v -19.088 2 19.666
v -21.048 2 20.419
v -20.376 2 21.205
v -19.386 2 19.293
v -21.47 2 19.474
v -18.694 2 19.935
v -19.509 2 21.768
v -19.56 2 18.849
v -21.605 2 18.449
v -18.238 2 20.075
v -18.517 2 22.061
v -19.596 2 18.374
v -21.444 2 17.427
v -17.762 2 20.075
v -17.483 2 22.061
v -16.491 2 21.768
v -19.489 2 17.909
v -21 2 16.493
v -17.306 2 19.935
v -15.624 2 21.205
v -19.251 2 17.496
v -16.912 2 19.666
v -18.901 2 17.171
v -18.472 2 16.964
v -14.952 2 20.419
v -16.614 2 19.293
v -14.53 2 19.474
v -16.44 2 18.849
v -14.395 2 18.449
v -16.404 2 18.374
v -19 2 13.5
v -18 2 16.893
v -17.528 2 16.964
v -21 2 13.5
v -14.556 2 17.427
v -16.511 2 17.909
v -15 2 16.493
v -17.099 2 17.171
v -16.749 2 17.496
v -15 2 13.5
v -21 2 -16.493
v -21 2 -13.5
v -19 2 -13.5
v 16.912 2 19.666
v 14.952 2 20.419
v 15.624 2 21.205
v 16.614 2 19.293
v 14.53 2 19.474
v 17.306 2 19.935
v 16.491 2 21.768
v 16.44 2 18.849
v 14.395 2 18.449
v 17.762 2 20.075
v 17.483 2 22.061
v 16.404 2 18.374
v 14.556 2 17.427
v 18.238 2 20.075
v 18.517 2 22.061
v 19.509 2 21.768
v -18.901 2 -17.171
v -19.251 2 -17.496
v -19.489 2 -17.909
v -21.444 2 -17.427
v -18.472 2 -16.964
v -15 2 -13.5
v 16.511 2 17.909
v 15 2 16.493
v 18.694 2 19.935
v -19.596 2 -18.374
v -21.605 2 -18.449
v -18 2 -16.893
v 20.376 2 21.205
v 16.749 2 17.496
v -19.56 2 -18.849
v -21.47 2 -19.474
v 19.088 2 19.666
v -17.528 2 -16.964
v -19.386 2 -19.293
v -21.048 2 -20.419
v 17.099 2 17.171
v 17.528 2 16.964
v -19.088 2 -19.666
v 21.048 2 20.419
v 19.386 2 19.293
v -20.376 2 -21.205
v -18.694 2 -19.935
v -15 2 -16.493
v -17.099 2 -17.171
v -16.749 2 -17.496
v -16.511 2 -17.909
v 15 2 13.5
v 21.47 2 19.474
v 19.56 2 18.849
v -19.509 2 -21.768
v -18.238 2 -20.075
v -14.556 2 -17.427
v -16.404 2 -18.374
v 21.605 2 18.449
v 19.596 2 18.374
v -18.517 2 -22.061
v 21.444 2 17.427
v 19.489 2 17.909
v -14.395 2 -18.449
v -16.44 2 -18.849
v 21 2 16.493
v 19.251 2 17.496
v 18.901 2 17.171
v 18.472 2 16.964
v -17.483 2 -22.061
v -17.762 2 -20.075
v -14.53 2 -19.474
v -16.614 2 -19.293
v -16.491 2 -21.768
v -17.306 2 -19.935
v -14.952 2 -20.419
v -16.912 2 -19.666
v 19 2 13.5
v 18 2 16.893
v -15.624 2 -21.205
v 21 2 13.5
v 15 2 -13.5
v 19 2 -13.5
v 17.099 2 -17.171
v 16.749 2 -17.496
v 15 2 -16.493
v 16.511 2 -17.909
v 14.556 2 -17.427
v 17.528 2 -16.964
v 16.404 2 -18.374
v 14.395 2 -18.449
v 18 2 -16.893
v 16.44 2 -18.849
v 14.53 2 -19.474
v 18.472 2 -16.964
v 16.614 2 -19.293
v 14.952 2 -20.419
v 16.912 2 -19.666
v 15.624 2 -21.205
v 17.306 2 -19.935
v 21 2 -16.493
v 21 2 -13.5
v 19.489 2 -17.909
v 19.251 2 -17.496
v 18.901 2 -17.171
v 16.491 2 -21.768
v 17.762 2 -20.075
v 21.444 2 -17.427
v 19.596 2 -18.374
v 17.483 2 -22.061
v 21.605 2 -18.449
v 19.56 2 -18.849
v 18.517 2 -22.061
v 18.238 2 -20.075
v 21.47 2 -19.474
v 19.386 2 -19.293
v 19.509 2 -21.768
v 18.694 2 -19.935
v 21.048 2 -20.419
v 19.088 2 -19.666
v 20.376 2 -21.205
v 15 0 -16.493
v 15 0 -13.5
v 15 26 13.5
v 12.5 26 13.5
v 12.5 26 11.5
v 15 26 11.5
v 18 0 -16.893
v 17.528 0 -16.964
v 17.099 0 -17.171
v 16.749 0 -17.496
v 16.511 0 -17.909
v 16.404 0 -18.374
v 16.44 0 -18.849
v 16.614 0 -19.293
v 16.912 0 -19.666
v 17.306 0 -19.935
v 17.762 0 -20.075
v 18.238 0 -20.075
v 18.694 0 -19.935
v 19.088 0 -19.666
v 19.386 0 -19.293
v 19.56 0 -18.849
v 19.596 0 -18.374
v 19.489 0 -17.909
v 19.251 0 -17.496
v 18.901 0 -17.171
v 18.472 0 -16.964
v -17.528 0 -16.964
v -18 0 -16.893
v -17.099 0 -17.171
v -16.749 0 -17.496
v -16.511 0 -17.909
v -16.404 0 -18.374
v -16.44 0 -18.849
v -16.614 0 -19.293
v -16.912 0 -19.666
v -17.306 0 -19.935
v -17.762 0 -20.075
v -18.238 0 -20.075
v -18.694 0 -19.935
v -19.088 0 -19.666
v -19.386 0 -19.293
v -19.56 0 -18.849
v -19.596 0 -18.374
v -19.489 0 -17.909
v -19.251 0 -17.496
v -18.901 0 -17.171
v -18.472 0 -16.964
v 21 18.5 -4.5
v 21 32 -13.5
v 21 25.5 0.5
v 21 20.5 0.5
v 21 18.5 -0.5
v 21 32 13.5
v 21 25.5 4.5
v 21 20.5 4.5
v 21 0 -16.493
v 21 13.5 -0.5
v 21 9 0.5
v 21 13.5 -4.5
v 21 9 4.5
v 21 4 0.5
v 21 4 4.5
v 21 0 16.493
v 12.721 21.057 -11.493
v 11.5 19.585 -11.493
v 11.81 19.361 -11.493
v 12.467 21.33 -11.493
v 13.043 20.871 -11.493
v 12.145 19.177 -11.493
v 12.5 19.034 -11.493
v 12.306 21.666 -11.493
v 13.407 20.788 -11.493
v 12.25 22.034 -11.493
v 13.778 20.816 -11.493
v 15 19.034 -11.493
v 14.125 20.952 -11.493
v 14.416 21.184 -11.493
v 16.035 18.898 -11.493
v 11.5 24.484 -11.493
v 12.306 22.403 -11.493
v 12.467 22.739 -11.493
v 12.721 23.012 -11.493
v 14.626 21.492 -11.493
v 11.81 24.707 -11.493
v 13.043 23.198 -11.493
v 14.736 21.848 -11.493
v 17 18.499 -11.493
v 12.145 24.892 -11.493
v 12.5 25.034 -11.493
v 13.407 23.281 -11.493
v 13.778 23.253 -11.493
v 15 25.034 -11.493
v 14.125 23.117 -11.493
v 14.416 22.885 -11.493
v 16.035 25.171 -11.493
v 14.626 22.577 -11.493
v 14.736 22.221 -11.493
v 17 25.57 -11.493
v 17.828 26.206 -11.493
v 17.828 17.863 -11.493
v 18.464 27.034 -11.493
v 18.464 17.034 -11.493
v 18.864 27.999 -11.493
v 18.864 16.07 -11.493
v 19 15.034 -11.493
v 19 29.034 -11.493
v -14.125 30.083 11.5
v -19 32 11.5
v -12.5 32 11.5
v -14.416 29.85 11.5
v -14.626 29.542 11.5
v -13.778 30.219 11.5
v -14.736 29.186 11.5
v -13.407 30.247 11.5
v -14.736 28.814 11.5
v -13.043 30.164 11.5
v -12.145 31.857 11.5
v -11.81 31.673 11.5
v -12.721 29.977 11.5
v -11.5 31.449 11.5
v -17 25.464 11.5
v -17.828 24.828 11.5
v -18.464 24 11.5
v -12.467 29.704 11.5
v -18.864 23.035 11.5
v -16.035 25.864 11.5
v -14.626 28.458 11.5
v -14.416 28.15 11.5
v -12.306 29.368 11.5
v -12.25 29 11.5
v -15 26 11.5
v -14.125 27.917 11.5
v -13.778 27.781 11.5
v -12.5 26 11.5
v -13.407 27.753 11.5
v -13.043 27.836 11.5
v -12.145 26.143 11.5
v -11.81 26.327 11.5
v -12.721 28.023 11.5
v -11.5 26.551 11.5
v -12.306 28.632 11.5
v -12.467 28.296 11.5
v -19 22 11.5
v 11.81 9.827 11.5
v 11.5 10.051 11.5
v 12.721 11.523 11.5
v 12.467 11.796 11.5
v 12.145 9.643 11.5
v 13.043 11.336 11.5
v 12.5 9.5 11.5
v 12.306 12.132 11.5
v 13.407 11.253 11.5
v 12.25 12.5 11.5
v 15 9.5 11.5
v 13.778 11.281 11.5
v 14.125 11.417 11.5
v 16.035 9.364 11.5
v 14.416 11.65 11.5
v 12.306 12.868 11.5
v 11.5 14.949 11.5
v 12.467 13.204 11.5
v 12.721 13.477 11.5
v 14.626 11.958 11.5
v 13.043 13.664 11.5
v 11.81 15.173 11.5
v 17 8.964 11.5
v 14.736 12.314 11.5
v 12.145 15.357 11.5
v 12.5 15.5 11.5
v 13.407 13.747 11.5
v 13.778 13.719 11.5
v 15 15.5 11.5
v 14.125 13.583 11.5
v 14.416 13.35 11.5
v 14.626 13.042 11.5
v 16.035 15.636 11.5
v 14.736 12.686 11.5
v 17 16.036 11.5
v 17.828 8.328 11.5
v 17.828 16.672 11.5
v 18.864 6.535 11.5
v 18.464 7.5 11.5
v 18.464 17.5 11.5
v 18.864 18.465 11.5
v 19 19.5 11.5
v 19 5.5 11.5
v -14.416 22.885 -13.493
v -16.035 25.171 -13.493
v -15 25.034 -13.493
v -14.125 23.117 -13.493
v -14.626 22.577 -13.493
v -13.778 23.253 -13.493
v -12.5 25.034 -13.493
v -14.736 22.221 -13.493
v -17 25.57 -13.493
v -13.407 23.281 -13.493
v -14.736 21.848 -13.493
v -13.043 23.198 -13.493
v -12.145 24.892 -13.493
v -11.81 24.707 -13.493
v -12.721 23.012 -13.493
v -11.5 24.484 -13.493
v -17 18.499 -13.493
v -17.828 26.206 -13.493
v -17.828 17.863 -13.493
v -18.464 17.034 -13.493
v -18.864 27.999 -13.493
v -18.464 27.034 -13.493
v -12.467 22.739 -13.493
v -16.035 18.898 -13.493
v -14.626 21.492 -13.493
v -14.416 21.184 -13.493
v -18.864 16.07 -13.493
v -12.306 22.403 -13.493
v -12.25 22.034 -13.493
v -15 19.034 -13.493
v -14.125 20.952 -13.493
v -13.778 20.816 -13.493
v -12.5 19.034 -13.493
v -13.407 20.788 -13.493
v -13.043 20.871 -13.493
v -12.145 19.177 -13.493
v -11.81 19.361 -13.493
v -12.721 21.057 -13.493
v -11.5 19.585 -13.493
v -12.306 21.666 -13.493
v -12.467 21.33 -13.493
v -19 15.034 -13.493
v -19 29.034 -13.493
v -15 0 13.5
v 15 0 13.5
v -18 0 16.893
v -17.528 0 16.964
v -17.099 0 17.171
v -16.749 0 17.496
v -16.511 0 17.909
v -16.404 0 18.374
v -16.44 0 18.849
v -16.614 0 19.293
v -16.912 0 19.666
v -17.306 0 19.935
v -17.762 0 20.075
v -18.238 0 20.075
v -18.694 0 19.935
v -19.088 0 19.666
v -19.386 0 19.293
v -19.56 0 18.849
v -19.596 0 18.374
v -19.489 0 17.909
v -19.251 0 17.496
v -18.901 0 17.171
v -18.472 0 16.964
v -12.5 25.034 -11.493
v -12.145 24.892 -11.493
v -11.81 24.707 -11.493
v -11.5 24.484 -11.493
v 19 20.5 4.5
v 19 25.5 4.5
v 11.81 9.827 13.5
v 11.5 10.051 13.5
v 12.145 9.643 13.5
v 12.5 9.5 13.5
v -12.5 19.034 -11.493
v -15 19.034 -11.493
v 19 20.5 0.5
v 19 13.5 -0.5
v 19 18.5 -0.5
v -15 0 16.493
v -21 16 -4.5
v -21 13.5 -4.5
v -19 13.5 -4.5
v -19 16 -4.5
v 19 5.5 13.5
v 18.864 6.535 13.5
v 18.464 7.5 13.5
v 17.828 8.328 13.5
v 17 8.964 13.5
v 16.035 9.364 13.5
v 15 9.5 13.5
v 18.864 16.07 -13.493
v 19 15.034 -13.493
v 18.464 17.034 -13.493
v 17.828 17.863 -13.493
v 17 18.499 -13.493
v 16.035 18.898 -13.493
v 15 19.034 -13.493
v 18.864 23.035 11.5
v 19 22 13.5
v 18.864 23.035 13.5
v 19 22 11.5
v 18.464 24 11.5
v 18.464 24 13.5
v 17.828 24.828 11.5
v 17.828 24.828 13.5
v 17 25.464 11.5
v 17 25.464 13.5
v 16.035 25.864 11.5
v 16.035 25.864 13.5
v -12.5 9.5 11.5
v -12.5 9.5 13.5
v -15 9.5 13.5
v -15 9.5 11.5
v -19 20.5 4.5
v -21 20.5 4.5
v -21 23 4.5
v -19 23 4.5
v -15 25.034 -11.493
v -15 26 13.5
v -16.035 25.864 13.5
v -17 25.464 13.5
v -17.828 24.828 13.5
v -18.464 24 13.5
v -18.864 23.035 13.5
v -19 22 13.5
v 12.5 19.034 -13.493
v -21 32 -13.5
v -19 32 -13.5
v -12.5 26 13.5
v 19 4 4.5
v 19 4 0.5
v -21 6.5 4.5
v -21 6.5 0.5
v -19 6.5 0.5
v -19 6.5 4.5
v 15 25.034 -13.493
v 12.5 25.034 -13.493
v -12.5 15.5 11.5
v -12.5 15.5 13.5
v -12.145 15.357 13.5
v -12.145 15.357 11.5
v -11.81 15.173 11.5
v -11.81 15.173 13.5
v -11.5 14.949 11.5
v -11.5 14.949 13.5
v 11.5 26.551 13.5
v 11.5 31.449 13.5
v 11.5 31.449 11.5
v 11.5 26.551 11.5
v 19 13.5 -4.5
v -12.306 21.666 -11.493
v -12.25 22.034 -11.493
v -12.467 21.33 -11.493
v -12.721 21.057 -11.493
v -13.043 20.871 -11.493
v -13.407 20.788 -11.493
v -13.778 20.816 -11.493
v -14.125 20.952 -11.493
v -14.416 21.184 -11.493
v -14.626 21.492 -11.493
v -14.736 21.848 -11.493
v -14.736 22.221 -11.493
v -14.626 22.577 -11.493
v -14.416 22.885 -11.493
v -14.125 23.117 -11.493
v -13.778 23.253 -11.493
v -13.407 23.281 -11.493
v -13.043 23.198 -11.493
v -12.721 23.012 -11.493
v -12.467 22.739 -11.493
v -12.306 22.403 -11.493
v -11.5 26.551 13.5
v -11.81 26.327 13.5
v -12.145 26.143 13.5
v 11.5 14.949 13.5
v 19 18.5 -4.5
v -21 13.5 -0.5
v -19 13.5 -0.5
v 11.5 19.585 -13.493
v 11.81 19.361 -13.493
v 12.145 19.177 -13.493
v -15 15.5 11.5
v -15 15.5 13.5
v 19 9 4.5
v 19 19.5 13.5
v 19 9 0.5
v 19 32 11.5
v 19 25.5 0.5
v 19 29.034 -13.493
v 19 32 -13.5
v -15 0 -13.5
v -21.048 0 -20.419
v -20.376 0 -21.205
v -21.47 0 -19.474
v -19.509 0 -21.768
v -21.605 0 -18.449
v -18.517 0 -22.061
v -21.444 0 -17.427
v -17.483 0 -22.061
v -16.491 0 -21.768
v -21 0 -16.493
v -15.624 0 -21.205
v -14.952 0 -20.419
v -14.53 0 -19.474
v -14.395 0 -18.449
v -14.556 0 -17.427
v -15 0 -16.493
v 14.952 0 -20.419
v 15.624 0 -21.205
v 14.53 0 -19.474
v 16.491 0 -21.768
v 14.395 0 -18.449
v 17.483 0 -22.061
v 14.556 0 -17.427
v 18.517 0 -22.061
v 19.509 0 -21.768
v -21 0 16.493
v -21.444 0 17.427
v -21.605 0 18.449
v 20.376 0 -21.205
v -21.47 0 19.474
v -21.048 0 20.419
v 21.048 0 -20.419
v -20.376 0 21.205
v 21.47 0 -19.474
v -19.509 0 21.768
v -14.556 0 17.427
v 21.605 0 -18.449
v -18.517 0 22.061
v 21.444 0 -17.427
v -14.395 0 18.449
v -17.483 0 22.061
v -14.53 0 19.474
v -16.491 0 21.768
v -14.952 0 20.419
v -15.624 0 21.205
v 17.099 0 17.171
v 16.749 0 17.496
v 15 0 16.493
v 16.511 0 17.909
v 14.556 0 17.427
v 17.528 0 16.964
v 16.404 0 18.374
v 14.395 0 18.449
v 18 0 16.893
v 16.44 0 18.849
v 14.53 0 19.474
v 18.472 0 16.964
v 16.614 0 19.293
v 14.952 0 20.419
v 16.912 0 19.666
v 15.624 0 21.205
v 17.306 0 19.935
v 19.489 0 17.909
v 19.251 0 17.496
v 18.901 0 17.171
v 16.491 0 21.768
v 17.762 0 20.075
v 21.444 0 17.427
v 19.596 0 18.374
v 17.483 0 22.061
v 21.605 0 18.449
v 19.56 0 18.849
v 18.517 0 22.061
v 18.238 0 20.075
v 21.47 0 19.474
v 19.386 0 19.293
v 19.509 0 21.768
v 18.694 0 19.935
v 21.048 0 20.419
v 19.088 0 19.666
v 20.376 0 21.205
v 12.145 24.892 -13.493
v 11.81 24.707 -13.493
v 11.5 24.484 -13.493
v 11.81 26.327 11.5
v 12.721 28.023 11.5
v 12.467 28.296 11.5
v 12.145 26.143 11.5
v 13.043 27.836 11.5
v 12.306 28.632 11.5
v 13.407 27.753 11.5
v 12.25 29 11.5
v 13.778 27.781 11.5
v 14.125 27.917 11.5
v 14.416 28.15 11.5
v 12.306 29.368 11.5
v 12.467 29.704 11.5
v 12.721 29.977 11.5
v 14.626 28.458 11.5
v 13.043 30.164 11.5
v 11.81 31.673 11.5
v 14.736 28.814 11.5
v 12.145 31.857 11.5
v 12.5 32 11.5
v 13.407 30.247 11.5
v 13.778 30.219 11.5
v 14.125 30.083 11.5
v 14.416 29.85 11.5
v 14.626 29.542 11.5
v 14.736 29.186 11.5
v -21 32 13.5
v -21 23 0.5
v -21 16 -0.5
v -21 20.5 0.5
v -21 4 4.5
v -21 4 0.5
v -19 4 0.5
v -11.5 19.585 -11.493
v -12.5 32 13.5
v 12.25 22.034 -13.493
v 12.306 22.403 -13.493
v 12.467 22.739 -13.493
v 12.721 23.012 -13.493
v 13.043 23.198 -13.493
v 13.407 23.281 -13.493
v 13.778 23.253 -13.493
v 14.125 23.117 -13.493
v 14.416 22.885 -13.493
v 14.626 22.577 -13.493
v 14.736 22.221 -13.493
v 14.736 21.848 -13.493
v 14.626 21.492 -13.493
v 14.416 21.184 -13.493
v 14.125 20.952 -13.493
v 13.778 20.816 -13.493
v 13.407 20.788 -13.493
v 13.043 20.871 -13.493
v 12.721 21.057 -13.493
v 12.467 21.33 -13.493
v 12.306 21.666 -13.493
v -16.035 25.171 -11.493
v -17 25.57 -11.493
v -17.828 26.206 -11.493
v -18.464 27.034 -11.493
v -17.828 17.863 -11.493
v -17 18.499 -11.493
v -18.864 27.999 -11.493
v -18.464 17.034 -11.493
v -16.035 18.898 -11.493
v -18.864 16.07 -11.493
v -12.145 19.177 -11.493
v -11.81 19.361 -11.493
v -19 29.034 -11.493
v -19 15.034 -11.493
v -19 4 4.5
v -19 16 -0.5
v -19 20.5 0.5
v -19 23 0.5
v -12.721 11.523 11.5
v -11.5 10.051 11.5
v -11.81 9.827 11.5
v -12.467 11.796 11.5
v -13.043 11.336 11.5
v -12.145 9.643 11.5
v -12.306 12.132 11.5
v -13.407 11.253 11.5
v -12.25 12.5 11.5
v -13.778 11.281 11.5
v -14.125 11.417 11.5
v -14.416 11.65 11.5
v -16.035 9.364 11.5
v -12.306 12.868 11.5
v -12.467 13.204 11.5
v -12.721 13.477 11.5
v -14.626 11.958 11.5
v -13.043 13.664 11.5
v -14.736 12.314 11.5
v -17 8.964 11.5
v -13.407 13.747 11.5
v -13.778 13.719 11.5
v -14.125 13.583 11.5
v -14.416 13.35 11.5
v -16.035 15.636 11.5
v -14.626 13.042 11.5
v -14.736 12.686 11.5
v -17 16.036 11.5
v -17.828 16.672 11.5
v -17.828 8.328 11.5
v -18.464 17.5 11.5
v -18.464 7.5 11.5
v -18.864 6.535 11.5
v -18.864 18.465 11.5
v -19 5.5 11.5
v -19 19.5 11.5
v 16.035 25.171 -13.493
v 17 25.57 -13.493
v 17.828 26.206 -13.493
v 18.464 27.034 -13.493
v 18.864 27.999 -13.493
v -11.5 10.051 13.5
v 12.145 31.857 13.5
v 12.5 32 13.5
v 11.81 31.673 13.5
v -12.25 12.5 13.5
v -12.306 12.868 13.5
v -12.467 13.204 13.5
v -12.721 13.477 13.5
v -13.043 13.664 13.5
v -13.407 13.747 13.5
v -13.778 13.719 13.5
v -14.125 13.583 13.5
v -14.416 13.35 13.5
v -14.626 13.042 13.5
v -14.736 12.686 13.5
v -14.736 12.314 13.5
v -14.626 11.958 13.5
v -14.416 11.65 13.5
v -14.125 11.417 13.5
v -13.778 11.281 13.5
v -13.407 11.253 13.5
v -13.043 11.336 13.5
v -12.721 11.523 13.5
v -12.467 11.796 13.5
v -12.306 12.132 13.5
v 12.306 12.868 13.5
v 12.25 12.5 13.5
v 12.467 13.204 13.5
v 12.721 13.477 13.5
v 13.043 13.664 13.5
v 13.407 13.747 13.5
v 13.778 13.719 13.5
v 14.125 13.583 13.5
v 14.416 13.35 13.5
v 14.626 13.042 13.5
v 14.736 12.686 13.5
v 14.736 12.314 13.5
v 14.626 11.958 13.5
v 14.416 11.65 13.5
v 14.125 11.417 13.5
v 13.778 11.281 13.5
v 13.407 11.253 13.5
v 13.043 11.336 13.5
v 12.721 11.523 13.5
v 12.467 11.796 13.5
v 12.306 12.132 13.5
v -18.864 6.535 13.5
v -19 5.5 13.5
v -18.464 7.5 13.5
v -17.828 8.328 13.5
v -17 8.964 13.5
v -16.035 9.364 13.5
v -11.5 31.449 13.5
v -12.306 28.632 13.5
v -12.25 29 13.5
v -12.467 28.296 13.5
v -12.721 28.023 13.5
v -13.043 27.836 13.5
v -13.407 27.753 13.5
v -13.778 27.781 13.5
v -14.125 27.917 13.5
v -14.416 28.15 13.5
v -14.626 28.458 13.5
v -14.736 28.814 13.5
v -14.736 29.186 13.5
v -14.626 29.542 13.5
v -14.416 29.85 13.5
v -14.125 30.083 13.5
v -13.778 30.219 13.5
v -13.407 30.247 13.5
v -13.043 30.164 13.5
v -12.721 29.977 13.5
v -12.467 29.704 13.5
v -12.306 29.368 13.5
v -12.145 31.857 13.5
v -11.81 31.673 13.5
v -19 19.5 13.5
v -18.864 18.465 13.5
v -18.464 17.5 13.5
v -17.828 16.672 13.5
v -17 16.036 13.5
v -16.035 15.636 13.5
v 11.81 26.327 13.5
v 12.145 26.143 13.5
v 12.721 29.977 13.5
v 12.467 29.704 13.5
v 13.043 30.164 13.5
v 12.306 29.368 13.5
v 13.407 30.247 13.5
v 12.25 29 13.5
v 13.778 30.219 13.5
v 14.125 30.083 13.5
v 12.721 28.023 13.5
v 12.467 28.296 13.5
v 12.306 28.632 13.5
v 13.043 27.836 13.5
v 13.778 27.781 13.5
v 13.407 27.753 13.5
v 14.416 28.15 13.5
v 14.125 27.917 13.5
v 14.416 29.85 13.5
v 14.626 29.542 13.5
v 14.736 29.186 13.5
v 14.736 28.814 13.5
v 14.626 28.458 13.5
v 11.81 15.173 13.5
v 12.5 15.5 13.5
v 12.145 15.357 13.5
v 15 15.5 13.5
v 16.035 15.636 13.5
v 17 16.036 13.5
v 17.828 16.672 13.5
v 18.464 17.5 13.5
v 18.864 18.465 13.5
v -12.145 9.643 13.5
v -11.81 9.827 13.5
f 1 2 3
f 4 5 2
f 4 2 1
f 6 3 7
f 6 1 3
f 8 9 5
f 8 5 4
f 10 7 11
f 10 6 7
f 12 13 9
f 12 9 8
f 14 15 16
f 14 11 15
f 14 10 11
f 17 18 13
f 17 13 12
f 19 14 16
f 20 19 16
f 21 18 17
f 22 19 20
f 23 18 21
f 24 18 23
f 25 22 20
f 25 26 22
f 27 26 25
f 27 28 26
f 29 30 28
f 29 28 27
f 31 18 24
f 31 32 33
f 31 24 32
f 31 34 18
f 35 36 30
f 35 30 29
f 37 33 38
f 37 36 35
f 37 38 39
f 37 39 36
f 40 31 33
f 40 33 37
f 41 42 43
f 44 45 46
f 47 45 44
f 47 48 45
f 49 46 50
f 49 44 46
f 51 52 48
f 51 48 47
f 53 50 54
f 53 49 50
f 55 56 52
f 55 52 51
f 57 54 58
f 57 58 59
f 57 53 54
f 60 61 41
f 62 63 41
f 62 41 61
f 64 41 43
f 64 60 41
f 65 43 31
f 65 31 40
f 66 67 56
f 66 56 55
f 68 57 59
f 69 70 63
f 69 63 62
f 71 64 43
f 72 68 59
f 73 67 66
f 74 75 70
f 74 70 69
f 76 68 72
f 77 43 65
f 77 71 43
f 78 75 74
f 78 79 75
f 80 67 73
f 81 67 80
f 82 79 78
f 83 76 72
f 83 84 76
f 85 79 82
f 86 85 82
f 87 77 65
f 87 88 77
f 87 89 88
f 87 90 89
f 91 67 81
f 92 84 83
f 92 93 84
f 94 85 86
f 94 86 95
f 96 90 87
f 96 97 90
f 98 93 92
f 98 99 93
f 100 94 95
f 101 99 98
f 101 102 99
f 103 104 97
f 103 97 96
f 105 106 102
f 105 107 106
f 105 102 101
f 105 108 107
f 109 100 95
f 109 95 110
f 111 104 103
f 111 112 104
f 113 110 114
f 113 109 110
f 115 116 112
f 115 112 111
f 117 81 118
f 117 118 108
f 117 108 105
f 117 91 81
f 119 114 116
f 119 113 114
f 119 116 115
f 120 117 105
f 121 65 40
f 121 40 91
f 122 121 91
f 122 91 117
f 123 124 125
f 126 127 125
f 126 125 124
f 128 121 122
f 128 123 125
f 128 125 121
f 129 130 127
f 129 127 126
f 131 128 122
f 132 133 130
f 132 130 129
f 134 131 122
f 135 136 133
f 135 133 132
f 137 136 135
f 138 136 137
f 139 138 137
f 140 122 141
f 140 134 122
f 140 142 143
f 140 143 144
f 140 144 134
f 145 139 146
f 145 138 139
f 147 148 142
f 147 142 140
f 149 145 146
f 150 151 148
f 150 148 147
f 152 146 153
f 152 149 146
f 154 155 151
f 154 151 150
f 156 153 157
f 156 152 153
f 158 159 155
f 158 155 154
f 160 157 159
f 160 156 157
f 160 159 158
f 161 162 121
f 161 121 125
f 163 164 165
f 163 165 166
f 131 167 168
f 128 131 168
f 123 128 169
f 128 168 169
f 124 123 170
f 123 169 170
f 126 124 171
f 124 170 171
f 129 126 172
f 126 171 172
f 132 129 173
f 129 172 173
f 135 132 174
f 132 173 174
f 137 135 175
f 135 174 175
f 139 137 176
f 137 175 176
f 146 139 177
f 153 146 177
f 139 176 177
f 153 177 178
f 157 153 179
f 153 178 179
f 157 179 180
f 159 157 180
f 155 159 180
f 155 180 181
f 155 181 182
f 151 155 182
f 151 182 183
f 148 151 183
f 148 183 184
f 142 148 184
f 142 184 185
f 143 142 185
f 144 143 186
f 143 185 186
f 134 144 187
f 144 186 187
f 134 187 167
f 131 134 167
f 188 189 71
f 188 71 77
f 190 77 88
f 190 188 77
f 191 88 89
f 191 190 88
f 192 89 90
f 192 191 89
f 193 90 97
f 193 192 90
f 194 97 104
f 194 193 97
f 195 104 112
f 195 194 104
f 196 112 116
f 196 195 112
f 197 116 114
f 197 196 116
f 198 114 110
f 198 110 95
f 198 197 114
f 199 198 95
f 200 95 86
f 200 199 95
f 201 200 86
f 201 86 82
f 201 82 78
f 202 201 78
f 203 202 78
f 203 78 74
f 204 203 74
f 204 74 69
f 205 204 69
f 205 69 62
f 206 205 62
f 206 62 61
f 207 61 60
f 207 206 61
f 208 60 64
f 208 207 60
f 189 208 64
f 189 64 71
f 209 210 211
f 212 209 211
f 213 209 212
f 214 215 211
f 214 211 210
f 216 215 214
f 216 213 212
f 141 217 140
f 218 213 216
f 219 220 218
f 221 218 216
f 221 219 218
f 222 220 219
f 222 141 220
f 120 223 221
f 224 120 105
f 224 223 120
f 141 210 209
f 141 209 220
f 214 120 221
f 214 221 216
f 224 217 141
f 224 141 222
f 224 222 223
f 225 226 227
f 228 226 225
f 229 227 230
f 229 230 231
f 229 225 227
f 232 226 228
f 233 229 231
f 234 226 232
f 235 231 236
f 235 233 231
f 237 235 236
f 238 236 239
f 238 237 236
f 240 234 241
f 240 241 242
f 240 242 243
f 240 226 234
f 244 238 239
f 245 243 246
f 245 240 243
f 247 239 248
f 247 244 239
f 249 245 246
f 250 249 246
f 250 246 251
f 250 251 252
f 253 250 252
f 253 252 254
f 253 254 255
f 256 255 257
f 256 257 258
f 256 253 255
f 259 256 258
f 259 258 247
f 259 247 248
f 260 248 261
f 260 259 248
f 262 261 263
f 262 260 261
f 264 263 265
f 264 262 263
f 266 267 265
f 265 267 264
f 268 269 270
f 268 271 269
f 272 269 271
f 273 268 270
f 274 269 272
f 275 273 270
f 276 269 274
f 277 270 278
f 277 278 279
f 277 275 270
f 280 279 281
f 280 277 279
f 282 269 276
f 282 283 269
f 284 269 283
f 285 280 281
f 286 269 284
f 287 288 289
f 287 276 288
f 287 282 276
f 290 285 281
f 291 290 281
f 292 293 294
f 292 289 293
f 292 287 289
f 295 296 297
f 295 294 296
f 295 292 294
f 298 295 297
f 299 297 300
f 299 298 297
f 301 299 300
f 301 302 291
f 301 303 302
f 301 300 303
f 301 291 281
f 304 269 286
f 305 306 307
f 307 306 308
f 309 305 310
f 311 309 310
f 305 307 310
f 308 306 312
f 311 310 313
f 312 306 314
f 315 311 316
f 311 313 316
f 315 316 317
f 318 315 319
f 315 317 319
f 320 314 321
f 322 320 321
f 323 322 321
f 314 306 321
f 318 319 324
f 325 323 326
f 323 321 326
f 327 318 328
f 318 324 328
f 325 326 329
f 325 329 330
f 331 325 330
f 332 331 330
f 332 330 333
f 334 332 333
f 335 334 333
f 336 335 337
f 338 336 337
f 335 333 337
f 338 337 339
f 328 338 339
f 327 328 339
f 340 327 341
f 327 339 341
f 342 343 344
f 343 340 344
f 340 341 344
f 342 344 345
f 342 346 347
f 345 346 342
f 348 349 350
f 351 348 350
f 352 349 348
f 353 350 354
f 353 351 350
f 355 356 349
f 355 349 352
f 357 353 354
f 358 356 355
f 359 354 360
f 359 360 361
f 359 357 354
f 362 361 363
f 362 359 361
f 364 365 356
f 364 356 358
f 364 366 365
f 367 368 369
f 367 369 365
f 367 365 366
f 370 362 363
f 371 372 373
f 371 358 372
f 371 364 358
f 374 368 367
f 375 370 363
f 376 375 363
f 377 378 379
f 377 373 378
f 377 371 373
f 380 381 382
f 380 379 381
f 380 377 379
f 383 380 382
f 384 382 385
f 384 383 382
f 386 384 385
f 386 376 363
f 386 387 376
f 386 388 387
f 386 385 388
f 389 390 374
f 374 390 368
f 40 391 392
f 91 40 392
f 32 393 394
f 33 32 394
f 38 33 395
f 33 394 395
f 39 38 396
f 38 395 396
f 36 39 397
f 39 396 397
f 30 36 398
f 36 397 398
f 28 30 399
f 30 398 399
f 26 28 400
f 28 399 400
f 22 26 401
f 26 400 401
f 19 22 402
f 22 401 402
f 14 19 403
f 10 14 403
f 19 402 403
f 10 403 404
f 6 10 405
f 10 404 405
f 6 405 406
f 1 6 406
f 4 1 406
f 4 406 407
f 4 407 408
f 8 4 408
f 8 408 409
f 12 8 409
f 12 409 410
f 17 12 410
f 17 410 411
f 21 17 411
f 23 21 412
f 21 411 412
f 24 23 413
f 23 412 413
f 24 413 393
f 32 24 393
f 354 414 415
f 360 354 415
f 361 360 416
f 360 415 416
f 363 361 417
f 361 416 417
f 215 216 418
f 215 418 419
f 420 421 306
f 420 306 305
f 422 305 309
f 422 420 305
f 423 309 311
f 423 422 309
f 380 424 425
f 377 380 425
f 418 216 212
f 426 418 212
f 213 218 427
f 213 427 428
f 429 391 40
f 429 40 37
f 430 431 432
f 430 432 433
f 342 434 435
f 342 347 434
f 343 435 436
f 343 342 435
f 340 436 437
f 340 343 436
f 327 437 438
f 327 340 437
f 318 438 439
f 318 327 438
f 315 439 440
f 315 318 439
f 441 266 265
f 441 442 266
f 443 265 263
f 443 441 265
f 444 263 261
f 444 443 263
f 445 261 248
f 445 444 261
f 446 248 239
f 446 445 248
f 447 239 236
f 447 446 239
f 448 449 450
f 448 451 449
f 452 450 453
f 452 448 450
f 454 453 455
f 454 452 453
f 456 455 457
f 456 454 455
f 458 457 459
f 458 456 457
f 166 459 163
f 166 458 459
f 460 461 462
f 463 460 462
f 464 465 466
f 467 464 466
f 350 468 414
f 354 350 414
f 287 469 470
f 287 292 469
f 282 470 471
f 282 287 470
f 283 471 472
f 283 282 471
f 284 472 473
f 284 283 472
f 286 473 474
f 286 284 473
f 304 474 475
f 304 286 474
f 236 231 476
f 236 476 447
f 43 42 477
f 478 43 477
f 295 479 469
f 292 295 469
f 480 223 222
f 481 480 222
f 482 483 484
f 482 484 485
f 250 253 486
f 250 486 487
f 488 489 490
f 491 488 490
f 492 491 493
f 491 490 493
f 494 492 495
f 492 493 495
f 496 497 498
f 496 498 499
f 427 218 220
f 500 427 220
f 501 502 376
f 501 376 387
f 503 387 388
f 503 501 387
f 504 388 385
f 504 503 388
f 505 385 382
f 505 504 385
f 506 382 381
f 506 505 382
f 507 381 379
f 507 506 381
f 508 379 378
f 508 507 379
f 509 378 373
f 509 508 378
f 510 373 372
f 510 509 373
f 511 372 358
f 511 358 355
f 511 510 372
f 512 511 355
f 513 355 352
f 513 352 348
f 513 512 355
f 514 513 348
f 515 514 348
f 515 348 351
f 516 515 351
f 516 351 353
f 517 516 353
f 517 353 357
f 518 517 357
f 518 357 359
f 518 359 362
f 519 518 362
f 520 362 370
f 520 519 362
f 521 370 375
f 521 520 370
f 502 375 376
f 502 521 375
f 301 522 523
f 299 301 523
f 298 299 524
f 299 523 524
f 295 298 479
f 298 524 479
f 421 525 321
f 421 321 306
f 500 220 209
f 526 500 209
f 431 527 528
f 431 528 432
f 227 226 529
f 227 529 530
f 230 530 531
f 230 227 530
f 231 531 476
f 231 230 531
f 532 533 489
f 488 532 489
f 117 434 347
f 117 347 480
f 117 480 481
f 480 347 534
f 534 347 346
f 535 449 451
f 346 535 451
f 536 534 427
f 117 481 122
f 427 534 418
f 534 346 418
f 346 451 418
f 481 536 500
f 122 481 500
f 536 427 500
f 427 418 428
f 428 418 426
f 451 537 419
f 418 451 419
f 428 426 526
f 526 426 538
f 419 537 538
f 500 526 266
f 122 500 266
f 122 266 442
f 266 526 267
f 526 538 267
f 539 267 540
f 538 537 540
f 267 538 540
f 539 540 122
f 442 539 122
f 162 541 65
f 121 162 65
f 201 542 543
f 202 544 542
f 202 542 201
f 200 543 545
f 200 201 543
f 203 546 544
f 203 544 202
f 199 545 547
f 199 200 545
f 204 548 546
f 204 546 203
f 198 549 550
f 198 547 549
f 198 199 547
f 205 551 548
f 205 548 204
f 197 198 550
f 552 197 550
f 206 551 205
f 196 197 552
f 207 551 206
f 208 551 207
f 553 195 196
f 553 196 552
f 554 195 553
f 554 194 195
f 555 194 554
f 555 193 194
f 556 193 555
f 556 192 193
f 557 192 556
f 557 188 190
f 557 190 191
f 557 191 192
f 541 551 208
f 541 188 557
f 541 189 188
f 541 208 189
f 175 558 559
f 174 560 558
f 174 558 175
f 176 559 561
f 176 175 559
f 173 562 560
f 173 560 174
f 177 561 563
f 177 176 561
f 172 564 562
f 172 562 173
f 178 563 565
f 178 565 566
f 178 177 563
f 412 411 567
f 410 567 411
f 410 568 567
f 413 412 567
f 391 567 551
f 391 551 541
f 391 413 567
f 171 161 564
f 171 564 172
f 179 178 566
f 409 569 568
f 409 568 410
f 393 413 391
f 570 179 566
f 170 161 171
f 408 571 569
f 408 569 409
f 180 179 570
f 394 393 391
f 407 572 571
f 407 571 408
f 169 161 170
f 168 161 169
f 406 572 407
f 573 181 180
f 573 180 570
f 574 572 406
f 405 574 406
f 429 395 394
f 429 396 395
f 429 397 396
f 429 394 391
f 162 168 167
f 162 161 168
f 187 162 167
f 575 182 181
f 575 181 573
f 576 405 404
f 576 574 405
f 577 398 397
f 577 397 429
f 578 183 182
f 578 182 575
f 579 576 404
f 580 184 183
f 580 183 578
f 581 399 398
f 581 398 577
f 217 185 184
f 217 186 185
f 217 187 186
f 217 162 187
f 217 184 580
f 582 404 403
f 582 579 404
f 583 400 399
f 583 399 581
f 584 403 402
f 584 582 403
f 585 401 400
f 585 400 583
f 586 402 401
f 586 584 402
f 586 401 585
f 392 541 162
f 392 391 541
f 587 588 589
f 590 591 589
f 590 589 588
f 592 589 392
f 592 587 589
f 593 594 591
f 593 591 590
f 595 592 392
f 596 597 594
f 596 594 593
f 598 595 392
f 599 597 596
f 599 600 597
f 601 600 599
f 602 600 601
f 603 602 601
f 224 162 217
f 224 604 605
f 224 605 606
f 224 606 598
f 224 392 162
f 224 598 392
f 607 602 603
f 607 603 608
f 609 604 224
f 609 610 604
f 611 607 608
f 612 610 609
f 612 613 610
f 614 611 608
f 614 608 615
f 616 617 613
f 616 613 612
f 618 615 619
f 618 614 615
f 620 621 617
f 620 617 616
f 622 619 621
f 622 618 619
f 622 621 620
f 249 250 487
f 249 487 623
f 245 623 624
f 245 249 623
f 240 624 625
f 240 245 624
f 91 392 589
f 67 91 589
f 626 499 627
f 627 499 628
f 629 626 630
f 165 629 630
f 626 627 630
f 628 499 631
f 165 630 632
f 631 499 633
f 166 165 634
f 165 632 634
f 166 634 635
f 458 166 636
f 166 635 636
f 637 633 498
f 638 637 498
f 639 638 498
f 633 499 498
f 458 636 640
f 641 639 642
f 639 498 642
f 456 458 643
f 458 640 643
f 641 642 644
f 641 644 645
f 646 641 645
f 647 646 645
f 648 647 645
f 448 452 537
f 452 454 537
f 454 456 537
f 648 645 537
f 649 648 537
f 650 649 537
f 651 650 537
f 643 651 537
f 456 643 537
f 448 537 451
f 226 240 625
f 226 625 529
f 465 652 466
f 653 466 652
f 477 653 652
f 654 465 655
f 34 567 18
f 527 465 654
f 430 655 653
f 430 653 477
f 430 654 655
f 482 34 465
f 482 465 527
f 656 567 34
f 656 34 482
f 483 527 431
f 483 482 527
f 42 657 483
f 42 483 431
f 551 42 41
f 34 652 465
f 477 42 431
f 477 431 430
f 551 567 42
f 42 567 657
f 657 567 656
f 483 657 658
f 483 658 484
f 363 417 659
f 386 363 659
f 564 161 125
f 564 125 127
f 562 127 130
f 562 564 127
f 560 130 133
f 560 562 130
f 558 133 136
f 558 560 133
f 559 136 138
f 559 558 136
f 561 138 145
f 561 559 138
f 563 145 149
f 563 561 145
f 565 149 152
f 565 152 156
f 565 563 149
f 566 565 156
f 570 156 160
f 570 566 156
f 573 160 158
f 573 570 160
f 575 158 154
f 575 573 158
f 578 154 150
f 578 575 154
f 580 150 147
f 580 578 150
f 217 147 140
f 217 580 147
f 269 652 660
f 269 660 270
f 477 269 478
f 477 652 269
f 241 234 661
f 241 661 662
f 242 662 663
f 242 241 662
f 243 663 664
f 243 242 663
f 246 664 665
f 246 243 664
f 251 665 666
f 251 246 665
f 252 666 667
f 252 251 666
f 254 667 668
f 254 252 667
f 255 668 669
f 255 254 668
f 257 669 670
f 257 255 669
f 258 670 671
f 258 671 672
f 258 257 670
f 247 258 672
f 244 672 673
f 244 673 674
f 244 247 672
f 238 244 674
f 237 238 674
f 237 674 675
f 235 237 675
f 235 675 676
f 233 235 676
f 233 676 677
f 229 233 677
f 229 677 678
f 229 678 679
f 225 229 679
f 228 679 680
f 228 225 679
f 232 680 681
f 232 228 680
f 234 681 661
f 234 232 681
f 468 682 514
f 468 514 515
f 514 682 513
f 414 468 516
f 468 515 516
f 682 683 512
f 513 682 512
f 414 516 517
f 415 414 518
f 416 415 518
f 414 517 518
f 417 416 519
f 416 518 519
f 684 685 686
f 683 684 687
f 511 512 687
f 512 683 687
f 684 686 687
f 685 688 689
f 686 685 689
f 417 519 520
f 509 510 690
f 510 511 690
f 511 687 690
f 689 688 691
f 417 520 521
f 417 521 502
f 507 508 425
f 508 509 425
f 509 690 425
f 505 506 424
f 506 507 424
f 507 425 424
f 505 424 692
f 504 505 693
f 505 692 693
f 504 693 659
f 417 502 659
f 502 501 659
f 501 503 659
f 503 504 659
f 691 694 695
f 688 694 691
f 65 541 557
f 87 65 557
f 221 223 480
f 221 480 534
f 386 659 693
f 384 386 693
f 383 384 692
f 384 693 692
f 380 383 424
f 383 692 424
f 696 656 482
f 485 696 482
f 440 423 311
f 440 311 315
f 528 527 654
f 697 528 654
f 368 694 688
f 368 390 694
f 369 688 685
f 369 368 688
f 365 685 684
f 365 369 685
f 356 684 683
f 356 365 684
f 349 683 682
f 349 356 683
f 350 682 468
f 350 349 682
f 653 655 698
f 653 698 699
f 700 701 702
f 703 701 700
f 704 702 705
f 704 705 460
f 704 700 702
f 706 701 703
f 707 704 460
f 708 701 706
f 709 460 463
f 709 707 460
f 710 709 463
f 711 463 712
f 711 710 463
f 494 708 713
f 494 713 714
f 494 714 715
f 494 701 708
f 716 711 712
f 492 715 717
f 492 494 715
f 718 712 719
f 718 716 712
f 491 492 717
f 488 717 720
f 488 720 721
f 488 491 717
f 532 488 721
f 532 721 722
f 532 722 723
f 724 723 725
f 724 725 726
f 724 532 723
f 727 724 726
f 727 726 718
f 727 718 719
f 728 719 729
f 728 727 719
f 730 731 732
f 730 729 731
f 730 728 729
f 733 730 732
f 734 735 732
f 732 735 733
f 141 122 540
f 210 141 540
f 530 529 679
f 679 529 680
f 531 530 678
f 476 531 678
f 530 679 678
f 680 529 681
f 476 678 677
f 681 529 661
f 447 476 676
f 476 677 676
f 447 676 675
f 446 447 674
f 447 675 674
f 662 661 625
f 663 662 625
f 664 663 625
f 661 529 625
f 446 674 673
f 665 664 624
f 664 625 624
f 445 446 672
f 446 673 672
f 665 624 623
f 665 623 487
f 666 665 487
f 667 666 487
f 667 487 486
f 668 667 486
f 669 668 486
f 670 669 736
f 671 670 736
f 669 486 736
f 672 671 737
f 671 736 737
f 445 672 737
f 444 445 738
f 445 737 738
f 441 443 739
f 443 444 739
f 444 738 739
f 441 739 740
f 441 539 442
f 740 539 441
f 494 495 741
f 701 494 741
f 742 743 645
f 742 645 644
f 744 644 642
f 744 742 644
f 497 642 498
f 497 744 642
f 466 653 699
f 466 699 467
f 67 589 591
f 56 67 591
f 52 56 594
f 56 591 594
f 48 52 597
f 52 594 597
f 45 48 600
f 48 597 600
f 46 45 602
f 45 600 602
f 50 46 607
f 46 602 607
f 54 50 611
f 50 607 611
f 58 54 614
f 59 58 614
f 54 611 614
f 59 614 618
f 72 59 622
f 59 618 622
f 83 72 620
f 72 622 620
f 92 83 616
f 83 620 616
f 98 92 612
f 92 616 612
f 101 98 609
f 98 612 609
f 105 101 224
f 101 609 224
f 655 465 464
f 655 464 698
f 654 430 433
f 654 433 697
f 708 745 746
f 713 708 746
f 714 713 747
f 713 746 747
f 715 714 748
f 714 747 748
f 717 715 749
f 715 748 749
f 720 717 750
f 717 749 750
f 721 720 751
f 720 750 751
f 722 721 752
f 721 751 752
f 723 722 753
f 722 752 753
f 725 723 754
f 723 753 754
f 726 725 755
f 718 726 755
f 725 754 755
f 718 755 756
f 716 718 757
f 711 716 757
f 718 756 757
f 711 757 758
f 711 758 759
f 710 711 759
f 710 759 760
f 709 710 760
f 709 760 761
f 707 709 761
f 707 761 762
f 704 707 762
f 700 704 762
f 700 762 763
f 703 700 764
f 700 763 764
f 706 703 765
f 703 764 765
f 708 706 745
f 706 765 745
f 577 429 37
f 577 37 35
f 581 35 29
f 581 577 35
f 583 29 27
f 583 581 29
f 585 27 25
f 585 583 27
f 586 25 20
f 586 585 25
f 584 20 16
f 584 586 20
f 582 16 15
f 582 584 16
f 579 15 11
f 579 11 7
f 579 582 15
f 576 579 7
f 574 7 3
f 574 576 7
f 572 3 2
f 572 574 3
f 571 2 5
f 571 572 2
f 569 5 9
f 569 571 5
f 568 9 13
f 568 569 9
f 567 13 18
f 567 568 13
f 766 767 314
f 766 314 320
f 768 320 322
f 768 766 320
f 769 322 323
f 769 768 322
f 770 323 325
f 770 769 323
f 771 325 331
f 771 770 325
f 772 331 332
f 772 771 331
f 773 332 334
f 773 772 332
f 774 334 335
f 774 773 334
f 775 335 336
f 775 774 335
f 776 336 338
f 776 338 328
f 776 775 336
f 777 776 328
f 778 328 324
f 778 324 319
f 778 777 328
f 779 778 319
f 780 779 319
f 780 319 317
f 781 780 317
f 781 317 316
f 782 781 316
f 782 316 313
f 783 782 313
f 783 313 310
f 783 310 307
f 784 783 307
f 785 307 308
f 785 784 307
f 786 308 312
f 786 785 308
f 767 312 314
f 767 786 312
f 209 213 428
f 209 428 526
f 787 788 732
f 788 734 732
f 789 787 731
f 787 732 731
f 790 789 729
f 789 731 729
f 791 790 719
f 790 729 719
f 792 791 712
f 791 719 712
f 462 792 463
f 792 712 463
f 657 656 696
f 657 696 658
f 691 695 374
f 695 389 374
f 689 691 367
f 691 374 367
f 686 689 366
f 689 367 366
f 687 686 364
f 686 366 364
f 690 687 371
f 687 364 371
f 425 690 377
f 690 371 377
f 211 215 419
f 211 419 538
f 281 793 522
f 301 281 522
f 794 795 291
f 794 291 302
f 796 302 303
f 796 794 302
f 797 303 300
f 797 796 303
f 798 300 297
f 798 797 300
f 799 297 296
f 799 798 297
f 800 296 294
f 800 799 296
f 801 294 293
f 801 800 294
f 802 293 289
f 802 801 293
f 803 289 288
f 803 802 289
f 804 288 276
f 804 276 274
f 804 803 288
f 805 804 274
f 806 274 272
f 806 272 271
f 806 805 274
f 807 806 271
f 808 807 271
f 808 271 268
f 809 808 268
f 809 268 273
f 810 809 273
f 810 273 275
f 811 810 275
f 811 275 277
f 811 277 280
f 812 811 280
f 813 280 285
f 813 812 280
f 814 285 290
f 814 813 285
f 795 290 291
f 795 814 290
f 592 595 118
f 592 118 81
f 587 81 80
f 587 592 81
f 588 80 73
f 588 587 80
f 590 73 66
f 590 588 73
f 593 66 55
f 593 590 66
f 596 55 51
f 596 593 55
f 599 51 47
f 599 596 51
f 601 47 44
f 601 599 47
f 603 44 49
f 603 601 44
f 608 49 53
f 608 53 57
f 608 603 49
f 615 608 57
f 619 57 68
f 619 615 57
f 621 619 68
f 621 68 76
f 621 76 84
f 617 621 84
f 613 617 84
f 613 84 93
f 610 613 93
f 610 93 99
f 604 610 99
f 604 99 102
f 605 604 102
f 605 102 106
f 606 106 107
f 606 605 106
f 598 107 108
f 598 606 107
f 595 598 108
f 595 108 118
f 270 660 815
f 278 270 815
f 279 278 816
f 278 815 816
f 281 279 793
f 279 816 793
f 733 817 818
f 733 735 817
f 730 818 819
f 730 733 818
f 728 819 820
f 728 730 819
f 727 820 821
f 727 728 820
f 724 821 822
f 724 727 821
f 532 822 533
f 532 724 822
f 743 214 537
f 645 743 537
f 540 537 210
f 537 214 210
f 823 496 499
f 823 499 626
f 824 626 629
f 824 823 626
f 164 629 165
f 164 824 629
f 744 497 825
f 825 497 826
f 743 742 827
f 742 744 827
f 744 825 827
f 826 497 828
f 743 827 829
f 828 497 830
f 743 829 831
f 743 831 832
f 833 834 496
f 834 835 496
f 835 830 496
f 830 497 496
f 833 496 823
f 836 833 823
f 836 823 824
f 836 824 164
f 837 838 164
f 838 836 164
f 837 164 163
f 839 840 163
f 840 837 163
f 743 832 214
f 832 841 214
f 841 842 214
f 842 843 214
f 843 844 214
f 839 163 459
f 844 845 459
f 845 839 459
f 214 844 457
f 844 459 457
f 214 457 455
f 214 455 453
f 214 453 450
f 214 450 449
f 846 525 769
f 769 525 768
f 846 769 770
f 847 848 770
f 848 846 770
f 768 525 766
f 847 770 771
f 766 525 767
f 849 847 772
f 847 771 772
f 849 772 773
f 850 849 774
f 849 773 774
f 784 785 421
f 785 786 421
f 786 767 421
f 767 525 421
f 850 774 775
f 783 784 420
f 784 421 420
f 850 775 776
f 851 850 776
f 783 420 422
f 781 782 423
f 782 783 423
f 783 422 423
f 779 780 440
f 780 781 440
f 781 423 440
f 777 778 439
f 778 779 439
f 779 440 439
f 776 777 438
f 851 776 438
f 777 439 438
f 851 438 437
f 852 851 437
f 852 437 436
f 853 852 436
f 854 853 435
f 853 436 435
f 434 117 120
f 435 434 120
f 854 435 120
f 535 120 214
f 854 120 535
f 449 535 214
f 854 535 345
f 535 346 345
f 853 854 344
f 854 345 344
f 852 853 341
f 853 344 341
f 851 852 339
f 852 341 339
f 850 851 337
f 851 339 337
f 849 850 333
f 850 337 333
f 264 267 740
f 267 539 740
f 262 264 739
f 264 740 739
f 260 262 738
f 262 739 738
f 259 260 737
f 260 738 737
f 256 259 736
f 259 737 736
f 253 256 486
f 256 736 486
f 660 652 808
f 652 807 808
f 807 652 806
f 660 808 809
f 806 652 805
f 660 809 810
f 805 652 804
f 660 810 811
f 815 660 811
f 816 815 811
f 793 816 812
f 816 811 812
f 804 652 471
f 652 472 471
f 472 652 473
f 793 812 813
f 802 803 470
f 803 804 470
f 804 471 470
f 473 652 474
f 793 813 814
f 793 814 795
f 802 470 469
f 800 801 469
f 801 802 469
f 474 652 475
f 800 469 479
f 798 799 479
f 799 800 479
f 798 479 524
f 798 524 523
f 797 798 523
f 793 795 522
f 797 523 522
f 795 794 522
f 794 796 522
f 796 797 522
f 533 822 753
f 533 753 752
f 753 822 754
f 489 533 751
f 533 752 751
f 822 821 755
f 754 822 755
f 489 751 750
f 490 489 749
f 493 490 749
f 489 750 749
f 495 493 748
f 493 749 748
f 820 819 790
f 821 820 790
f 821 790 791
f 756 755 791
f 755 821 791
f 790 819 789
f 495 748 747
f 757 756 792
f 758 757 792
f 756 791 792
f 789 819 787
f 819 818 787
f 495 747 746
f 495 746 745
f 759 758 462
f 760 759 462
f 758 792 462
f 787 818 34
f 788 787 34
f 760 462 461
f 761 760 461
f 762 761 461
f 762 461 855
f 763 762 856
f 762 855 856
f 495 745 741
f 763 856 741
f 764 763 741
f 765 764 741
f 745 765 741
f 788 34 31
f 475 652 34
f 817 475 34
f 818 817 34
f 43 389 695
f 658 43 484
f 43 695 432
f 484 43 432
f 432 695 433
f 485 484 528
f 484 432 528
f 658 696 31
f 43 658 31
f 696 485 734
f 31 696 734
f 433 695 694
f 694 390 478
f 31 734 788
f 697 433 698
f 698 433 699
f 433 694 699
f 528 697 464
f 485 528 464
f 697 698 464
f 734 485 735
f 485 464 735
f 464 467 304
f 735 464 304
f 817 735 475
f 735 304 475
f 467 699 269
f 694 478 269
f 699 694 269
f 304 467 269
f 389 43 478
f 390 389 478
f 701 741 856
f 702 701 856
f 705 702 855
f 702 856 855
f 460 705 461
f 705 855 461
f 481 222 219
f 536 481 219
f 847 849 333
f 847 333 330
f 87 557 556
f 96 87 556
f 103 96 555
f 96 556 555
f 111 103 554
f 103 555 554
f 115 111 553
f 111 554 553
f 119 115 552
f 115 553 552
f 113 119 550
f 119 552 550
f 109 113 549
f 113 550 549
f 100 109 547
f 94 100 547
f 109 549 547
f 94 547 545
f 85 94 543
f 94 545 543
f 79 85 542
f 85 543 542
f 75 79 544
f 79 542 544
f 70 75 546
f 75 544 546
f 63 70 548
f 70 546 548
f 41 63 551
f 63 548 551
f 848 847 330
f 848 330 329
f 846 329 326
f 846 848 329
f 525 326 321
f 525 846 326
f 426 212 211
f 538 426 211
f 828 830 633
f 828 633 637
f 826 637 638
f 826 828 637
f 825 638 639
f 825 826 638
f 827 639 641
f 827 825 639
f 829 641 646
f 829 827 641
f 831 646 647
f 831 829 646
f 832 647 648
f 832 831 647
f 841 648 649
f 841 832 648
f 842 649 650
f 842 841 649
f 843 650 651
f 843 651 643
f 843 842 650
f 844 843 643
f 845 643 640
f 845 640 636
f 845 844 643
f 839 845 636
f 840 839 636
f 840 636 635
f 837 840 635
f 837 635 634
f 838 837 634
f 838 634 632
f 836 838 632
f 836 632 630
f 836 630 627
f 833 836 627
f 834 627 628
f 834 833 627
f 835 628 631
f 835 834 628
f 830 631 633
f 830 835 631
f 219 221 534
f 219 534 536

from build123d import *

# Parameters (mm, degrees)
SKETCH_1_W                       = 42
SKETCH_1_H                       = 27
EXTRUDE_1_DEPTH                  = 2
SKETCH_2_W                       = 27
SKETCH_2_H                       = 30
SKETCH_2_W_2                     = 4
SKETCH_2_H_2                     = 5
EXTRUDE_2_DEPTH                  = 2
SKETCH_3_W                       = 4
SKETCH_3_H                       = 2.5
EXTRUDE_3_DEPTH                  = 2
SKETCH_4_R                       = 1.25
EXTRUDE_4_DEPTH                  = 2
PATTERN_LINEAR_1_COUNT           = 2
PATTERN_LINEAR_1_PITCH           = 16.5
PATTERN_LINEAR_1_COPY_1_SKETCH_R = 1.25
PATTERN_LINEAR_1_COPY_1_DEPTH    = 2
PATTERN_LINEAR_2_COUNT           = 2
PATTERN_LINEAR_2_PITCH           = 26.75
PATTERN_LINEAR_2_COPY_1_SKETCH_R = 1.25
PATTERN_LINEAR_2_COPY_1_DEPTH    = 2
FILLET_1_R                       = 4
SKETCH_8_R                       = 1.6
EXTRUDE_5_DEPTH                  = 2
MIRROR_4_COPY_1_SKETCH_R         = 1.6
MIRROR_4_COPY_1_DEPTH            = 2


with BuildPart() as part:
    # Эскиз1 → Бобышка-Вытянуть1 (new body)
    with BuildSketch(Plane(origin=(0, 0, 0), x_dir=(1, 0, 0), z_dir=(0, 1, 0))):
        Rectangle(SKETCH_1_W, SKETCH_1_H)
    extrude(amount=EXTRUDE_1_DEPTH)

    # Эскиз2 → Бобышка-Вытянуть2 (add)
    with BuildSketch(Plane(origin=(21, 0, 0), x_dir=(0, 0, -1), z_dir=(1, 0, 0))):
        with Locations((0, 17)):
            Rectangle(SKETCH_2_W, SKETCH_2_H)
        with Locations((-2.5, 6.5)):
            Rectangle(SKETCH_2_W_2, SKETCH_2_H_2, mode=Mode.SUBTRACT)
        with Locations((2.5, 16)):
            Rectangle(SKETCH_2_W_2, SKETCH_2_H_2, mode=Mode.SUBTRACT)
        with Locations((-2.5, 23)):
            Rectangle(SKETCH_2_W_2, SKETCH_2_H_2, mode=Mode.SUBTRACT)
    extrude_2 = extrude(amount=-EXTRUDE_2_DEPTH)

    # Зеркальное отражение1: Бобышка-Вытянуть2 across plane
    add(extrude_2.mirror(Plane(origin=(0, 0, 0), x_dir=(0, 0, 1), z_dir=(1, 0, 0))))

    # Эскиз3 → Бобышка-Вытянуть3 (add)
    with BuildSketch(Plane.ZY.offset(21)):
        with Locations((2.5, 24.25)):
            Rectangle(SKETCH_3_W, SKETCH_3_H)
        with Locations((-2.5, 17.25)):
            Rectangle(SKETCH_3_W, SKETCH_3_H)
        with Locations((2.5, 7.75)):
            Rectangle(SKETCH_3_W, SKETCH_3_H)
    extrude(amount=-EXTRUDE_3_DEPTH)

    # Эскиз4 → Бобышка-Вытянуть4 (add)
    with BuildSketch(Plane(origin=(0, 0, 13.5), x_dir=(-1, 0, 0), z_dir=(0, 0, -1))):
        with BuildLine():
            Line((-19, 9.5), (-19, 15.5))
            Line((-19, 15.5), (-12.5, 15.5))
            ThreePointArc((-12.5, 15.5), (-11.974953973, 15.270240895), (-11.5, 14.949489743))
            Line((-11.5, 14.949489743), (-11.5, 10.050510257))
            ThreePointArc((-11.5, 10.050510257), (-11.974953973, 9.729759105), (-12.5, 9.5))
            Line((-12.5, 9.5), (-19, 9.5))
        make_face()
        with Locations((-13.5, 12.5)):
            Circle(SKETCH_4_R, mode=Mode.SUBTRACT)
    extrude_4 = extrude(amount=EXTRUDE_4_DEPTH)

    # Зеркальное отражение2: Бобышка-Вытянуть4 across plane
    add(extrude_4.mirror(Plane(origin=(0, 0, 0), x_dir=(0, 0, 1), z_dir=(1, 0, 0))))

    # Линейный массив1: Бобышка-Вытянуть4 ×2
    with Locations(*[(0, i * PATTERN_LINEAR_1_PITCH, 0) for i in range(1, PATTERN_LINEAR_1_COUNT)]):
        add(extrude_4)

    # Линейный массив1 copy 1 sketch → Линейный массив1 copy 1 (add)
    with BuildSketch(Plane(origin=(0, 16.5, 13.5), x_dir=(1, 0, 0), z_dir=(0, 0, -1))):
        with BuildLine():
            Line((-19, -9.5), (-19, -15.5))
            Line((-19, -15.5), (-12.5, -15.5))
            ThreePointArc((-12.5, -15.5), (-11.974953973, -15.270240895), (-11.5, -14.949489743))
            Line((-11.5, -14.949489743), (-11.5, -10.050510257))
            ThreePointArc((-11.5, -10.050510257), (-11.974953973, -9.729759105), (-12.5, -9.5))
            Line((-12.5, -9.5), (-19, -9.5))
        make_face()
        with Locations((-13.5, -12.5)):
            Circle(PATTERN_LINEAR_1_COPY_1_SKETCH_R, mode=Mode.SUBTRACT)
    extrude(amount=PATTERN_LINEAR_1_COPY_1_DEPTH)

    # Линейный массив2: Бобышка-Вытянуть4 ×2
    with Locations(*[Vector(0, 0.3564269900834672, -0.9343231778887005) * (i * PATTERN_LINEAR_2_PITCH) for i in range(1, PATTERN_LINEAR_2_COUNT)]):
        add(extrude_4)

    # Линейный массив2 copy 1 sketch → Линейный массив2 copy 1 (add)
    with BuildSketch(Plane(origin=(0, 9.534421985, -11.493145009), x_dir=(1, 0, 0), z_dir=(0, 0, -1))):
        with BuildLine():
            Line((-19, -9.5), (-19, -15.5))
            Line((-19, -15.5), (-12.5, -15.5))
            ThreePointArc((-12.5, -15.5), (-11.974953973, -15.270240895), (-11.5, -14.949489743))
            Line((-11.5, -14.949489743), (-11.5, -10.050510257))
            ThreePointArc((-11.5, -10.050510257), (-11.974953973, -9.729759105), (-12.5, -9.5))
            Line((-12.5, -9.5), (-19, -9.5))
        make_face()
        with Locations((-13.5, -12.5)):
            Circle(PATTERN_LINEAR_2_COPY_1_SKETCH_R, mode=Mode.SUBTRACT)
    extrude(amount=PATTERN_LINEAR_2_COPY_1_DEPTH)

    # Скругление1
    fillet_1_edges = [part.edges().sort_by_distance(p)[0] for p in [
        (19, 15.5, 12.5),
        (19, 9.5, 12.5),
        (-19, 9.5, 12.5),
        (-19, 15.5, 12.5),
        (-19, 26, 12.5),
        (19, 26, 12.5),
        (-19, 19.034421985, -12.493145009),
        (-19, 25.034421985, -12.493145009),
        (19, 25.034421985, -12.493145009),
        (19, 19.034421985, -12.493145009),
    ]]
    fillet(fillet_1_edges, radius=FILLET_1_R)

    # Эскиз8 → Бобышка-Вытянуть5 (add)
    with BuildSketch(Plane(origin=(0, 0, 0), x_dir=(1, 0, 0), z_dir=(0, 1, 0))):
        with BuildLine():
            Line((-21, 13.5), (-18, 13.493145009))
            Line((-18, 13.493145009), (-15, 13.5))
            Line((-15, 13.5), (-15, 16.493145009))
            ThreePointArc((-15, 16.493145009), (-18, 22.098696284), (-21, 16.493145009))
            Line((-21, 16.493145009), (-21, 13.5))
        make_face()
        with Locations(Location((-18, 18.493145009, 0), (0, 0, 270))):
            Circle(SKETCH_8_R, mode=Mode.SUBTRACT)
    extrude_5 = extrude(amount=EXTRUDE_5_DEPTH)

    # Зеркальное отражение3: Бобышка-Вытянуть5 across plane
    add(extrude_5.mirror(Plane(origin=(0, 0, 0), x_dir=(0, 0, 1), z_dir=(1, 0, 0))))

    # Зеркальное отражение4: Бобышка-Вытянуть5 across plane
    add(extrude_5.mirror(Plane.XY))

    # Зеркальное отражение4 copy 1 sketch → Зеркальное отражение4 copy 1 (add)
    with BuildSketch(Plane(origin=(0, 0, 0), x_dir=(-1, 0, 0), z_dir=(0, 1, 0))):
        with BuildLine():
            Line((-21, 13.5), (-18, 13.493145009))
            Line((-18, 13.493145009), (-15, 13.5))
            Line((-15, 13.5), (-15, 16.493145009))
            ThreePointArc((-15, 16.493145009), (-18, 22.098696284), (-21, 16.493145009))
            Line((-21, 16.493145009), (-21, 13.5))
        make_face()
        with Locations(Location((-18, 18.493145009, 0), (0, 0, 270))):
            Circle(MIRROR_4_COPY_1_SKETCH_R, mode=Mode.SUBTRACT)
    extrude(amount=MIRROR_4_COPY_1_DEPTH)


solid = part.part
